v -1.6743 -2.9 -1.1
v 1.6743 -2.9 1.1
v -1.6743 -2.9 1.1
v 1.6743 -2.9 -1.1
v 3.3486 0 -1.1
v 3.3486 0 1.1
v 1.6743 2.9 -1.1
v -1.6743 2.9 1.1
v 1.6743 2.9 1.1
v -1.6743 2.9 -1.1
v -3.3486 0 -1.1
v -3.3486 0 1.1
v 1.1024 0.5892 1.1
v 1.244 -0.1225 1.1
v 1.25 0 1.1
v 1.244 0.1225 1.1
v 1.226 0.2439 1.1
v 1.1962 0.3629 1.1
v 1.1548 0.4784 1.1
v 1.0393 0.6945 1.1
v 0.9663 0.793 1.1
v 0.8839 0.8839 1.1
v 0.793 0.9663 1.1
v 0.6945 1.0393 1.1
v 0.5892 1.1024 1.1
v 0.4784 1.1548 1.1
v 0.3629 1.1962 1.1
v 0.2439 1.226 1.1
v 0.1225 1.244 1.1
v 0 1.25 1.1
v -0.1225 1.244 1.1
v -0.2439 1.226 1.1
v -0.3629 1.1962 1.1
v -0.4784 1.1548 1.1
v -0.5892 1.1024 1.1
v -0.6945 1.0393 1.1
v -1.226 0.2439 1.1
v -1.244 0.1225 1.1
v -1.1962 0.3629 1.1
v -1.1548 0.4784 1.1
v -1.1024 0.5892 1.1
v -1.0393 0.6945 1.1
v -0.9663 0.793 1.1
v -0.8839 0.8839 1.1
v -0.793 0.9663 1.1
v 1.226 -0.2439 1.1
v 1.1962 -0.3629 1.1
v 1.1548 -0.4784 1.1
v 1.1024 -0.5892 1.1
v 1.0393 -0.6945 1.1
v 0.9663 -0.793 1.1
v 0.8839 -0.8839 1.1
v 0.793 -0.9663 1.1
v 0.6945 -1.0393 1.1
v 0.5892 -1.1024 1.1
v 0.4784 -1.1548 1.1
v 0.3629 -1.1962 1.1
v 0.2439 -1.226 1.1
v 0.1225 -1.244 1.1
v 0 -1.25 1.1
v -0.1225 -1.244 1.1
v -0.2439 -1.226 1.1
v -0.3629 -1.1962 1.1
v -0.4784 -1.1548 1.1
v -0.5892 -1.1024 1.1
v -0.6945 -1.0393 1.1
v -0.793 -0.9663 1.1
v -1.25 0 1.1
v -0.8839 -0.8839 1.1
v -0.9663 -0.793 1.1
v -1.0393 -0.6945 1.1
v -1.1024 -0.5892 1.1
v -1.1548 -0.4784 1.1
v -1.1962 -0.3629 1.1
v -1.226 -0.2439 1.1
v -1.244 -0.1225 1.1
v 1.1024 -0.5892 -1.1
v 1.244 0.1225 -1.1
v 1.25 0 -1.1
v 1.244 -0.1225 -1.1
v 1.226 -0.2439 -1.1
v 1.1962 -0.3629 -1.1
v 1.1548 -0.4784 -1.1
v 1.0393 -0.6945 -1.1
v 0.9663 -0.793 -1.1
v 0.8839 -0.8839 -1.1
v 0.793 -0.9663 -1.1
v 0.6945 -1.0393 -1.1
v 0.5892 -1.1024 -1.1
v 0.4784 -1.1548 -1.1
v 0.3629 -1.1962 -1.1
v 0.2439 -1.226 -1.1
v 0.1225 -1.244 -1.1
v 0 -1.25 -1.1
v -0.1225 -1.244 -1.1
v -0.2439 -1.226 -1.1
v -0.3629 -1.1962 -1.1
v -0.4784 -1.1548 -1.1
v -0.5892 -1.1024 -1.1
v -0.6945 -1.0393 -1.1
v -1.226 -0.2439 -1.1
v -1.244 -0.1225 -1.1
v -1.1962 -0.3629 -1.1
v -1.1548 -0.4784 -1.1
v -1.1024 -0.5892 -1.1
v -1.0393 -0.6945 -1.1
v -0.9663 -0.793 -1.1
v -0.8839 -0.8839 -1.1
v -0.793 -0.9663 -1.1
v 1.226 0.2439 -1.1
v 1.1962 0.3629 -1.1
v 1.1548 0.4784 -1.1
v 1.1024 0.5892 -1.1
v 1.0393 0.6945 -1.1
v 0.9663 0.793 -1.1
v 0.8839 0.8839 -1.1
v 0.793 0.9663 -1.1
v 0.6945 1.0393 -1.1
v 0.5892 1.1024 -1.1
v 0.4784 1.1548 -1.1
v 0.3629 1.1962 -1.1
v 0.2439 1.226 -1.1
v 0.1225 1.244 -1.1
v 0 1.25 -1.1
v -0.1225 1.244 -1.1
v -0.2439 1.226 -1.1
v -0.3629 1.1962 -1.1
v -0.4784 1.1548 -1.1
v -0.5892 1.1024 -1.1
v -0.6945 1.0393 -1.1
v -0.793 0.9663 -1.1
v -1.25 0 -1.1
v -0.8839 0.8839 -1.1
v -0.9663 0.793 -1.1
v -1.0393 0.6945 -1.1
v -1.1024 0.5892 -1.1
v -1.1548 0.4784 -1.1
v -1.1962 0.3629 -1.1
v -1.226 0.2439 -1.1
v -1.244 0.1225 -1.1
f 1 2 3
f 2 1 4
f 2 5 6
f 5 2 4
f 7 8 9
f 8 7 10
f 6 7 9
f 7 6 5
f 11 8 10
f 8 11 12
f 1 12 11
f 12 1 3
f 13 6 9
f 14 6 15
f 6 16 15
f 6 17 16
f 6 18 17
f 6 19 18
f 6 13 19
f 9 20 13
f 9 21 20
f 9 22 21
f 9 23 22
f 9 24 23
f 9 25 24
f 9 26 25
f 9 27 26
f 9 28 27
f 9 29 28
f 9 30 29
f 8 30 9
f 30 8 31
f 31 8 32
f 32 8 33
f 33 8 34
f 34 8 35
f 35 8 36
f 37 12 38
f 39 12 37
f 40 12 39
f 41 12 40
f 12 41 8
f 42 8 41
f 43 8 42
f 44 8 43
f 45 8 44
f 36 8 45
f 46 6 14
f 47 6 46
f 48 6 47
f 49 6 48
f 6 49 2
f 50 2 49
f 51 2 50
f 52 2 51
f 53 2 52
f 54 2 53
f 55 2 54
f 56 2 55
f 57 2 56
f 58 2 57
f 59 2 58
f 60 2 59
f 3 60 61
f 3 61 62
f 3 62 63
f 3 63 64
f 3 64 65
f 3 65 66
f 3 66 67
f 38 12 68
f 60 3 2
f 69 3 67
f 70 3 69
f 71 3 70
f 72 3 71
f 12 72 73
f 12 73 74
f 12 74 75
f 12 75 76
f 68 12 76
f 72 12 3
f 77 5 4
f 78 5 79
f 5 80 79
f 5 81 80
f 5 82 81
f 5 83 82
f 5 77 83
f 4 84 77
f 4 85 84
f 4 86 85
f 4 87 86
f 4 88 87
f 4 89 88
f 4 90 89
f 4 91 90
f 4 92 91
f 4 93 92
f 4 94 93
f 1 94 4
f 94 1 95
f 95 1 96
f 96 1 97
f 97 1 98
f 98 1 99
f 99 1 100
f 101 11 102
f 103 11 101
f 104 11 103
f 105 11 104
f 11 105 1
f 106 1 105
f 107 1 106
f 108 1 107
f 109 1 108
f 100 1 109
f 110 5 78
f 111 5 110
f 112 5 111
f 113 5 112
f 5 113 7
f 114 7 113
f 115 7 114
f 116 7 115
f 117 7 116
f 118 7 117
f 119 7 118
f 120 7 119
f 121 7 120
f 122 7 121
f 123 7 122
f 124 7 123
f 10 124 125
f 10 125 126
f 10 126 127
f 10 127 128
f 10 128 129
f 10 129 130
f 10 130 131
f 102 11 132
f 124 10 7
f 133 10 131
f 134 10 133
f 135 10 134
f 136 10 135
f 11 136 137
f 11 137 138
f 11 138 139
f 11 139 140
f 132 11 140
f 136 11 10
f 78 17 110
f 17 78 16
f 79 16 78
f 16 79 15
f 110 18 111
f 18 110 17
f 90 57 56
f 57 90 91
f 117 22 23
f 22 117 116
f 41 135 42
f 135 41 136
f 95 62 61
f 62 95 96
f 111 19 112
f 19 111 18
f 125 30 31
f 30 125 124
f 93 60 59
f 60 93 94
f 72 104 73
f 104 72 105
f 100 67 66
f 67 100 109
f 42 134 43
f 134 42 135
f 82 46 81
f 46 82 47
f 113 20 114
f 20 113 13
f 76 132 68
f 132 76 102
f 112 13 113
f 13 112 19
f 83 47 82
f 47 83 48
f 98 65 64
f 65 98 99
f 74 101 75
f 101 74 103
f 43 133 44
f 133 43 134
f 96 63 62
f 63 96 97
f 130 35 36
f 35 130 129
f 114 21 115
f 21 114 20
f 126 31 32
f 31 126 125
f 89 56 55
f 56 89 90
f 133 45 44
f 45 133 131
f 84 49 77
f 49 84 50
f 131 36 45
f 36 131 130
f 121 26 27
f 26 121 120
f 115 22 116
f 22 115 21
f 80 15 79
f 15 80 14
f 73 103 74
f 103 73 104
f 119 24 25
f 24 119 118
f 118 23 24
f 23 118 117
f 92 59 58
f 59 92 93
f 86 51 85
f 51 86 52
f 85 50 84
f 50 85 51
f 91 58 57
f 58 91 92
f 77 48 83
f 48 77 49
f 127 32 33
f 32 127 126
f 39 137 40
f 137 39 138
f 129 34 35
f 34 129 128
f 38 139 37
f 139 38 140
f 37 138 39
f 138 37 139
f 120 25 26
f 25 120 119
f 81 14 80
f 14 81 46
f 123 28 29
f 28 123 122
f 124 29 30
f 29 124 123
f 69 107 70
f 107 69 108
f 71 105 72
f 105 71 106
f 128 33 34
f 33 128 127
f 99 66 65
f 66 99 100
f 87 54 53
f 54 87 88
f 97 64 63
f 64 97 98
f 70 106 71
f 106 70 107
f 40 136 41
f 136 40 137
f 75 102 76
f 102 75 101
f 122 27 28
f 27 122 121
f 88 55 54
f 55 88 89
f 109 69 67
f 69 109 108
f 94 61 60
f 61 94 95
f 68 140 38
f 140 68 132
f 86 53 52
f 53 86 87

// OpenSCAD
$fn=64;

nut_thickness = 2.2;
across_flats = 5.8;
hole_d = 2.5;

module hex_prism(af, h){
    r = af / sqrt(3);
    cylinder(h=h, r=r, center=true, $fn=6);
}

module nut(af, h, hole_d){
    difference(){
        hex_prism(af, h);
        cylinder(h=h+0.4, d=hole_d, center=true, $fn=64);
    }
}

nut(across_flats, nut_thickness, hole_d);
